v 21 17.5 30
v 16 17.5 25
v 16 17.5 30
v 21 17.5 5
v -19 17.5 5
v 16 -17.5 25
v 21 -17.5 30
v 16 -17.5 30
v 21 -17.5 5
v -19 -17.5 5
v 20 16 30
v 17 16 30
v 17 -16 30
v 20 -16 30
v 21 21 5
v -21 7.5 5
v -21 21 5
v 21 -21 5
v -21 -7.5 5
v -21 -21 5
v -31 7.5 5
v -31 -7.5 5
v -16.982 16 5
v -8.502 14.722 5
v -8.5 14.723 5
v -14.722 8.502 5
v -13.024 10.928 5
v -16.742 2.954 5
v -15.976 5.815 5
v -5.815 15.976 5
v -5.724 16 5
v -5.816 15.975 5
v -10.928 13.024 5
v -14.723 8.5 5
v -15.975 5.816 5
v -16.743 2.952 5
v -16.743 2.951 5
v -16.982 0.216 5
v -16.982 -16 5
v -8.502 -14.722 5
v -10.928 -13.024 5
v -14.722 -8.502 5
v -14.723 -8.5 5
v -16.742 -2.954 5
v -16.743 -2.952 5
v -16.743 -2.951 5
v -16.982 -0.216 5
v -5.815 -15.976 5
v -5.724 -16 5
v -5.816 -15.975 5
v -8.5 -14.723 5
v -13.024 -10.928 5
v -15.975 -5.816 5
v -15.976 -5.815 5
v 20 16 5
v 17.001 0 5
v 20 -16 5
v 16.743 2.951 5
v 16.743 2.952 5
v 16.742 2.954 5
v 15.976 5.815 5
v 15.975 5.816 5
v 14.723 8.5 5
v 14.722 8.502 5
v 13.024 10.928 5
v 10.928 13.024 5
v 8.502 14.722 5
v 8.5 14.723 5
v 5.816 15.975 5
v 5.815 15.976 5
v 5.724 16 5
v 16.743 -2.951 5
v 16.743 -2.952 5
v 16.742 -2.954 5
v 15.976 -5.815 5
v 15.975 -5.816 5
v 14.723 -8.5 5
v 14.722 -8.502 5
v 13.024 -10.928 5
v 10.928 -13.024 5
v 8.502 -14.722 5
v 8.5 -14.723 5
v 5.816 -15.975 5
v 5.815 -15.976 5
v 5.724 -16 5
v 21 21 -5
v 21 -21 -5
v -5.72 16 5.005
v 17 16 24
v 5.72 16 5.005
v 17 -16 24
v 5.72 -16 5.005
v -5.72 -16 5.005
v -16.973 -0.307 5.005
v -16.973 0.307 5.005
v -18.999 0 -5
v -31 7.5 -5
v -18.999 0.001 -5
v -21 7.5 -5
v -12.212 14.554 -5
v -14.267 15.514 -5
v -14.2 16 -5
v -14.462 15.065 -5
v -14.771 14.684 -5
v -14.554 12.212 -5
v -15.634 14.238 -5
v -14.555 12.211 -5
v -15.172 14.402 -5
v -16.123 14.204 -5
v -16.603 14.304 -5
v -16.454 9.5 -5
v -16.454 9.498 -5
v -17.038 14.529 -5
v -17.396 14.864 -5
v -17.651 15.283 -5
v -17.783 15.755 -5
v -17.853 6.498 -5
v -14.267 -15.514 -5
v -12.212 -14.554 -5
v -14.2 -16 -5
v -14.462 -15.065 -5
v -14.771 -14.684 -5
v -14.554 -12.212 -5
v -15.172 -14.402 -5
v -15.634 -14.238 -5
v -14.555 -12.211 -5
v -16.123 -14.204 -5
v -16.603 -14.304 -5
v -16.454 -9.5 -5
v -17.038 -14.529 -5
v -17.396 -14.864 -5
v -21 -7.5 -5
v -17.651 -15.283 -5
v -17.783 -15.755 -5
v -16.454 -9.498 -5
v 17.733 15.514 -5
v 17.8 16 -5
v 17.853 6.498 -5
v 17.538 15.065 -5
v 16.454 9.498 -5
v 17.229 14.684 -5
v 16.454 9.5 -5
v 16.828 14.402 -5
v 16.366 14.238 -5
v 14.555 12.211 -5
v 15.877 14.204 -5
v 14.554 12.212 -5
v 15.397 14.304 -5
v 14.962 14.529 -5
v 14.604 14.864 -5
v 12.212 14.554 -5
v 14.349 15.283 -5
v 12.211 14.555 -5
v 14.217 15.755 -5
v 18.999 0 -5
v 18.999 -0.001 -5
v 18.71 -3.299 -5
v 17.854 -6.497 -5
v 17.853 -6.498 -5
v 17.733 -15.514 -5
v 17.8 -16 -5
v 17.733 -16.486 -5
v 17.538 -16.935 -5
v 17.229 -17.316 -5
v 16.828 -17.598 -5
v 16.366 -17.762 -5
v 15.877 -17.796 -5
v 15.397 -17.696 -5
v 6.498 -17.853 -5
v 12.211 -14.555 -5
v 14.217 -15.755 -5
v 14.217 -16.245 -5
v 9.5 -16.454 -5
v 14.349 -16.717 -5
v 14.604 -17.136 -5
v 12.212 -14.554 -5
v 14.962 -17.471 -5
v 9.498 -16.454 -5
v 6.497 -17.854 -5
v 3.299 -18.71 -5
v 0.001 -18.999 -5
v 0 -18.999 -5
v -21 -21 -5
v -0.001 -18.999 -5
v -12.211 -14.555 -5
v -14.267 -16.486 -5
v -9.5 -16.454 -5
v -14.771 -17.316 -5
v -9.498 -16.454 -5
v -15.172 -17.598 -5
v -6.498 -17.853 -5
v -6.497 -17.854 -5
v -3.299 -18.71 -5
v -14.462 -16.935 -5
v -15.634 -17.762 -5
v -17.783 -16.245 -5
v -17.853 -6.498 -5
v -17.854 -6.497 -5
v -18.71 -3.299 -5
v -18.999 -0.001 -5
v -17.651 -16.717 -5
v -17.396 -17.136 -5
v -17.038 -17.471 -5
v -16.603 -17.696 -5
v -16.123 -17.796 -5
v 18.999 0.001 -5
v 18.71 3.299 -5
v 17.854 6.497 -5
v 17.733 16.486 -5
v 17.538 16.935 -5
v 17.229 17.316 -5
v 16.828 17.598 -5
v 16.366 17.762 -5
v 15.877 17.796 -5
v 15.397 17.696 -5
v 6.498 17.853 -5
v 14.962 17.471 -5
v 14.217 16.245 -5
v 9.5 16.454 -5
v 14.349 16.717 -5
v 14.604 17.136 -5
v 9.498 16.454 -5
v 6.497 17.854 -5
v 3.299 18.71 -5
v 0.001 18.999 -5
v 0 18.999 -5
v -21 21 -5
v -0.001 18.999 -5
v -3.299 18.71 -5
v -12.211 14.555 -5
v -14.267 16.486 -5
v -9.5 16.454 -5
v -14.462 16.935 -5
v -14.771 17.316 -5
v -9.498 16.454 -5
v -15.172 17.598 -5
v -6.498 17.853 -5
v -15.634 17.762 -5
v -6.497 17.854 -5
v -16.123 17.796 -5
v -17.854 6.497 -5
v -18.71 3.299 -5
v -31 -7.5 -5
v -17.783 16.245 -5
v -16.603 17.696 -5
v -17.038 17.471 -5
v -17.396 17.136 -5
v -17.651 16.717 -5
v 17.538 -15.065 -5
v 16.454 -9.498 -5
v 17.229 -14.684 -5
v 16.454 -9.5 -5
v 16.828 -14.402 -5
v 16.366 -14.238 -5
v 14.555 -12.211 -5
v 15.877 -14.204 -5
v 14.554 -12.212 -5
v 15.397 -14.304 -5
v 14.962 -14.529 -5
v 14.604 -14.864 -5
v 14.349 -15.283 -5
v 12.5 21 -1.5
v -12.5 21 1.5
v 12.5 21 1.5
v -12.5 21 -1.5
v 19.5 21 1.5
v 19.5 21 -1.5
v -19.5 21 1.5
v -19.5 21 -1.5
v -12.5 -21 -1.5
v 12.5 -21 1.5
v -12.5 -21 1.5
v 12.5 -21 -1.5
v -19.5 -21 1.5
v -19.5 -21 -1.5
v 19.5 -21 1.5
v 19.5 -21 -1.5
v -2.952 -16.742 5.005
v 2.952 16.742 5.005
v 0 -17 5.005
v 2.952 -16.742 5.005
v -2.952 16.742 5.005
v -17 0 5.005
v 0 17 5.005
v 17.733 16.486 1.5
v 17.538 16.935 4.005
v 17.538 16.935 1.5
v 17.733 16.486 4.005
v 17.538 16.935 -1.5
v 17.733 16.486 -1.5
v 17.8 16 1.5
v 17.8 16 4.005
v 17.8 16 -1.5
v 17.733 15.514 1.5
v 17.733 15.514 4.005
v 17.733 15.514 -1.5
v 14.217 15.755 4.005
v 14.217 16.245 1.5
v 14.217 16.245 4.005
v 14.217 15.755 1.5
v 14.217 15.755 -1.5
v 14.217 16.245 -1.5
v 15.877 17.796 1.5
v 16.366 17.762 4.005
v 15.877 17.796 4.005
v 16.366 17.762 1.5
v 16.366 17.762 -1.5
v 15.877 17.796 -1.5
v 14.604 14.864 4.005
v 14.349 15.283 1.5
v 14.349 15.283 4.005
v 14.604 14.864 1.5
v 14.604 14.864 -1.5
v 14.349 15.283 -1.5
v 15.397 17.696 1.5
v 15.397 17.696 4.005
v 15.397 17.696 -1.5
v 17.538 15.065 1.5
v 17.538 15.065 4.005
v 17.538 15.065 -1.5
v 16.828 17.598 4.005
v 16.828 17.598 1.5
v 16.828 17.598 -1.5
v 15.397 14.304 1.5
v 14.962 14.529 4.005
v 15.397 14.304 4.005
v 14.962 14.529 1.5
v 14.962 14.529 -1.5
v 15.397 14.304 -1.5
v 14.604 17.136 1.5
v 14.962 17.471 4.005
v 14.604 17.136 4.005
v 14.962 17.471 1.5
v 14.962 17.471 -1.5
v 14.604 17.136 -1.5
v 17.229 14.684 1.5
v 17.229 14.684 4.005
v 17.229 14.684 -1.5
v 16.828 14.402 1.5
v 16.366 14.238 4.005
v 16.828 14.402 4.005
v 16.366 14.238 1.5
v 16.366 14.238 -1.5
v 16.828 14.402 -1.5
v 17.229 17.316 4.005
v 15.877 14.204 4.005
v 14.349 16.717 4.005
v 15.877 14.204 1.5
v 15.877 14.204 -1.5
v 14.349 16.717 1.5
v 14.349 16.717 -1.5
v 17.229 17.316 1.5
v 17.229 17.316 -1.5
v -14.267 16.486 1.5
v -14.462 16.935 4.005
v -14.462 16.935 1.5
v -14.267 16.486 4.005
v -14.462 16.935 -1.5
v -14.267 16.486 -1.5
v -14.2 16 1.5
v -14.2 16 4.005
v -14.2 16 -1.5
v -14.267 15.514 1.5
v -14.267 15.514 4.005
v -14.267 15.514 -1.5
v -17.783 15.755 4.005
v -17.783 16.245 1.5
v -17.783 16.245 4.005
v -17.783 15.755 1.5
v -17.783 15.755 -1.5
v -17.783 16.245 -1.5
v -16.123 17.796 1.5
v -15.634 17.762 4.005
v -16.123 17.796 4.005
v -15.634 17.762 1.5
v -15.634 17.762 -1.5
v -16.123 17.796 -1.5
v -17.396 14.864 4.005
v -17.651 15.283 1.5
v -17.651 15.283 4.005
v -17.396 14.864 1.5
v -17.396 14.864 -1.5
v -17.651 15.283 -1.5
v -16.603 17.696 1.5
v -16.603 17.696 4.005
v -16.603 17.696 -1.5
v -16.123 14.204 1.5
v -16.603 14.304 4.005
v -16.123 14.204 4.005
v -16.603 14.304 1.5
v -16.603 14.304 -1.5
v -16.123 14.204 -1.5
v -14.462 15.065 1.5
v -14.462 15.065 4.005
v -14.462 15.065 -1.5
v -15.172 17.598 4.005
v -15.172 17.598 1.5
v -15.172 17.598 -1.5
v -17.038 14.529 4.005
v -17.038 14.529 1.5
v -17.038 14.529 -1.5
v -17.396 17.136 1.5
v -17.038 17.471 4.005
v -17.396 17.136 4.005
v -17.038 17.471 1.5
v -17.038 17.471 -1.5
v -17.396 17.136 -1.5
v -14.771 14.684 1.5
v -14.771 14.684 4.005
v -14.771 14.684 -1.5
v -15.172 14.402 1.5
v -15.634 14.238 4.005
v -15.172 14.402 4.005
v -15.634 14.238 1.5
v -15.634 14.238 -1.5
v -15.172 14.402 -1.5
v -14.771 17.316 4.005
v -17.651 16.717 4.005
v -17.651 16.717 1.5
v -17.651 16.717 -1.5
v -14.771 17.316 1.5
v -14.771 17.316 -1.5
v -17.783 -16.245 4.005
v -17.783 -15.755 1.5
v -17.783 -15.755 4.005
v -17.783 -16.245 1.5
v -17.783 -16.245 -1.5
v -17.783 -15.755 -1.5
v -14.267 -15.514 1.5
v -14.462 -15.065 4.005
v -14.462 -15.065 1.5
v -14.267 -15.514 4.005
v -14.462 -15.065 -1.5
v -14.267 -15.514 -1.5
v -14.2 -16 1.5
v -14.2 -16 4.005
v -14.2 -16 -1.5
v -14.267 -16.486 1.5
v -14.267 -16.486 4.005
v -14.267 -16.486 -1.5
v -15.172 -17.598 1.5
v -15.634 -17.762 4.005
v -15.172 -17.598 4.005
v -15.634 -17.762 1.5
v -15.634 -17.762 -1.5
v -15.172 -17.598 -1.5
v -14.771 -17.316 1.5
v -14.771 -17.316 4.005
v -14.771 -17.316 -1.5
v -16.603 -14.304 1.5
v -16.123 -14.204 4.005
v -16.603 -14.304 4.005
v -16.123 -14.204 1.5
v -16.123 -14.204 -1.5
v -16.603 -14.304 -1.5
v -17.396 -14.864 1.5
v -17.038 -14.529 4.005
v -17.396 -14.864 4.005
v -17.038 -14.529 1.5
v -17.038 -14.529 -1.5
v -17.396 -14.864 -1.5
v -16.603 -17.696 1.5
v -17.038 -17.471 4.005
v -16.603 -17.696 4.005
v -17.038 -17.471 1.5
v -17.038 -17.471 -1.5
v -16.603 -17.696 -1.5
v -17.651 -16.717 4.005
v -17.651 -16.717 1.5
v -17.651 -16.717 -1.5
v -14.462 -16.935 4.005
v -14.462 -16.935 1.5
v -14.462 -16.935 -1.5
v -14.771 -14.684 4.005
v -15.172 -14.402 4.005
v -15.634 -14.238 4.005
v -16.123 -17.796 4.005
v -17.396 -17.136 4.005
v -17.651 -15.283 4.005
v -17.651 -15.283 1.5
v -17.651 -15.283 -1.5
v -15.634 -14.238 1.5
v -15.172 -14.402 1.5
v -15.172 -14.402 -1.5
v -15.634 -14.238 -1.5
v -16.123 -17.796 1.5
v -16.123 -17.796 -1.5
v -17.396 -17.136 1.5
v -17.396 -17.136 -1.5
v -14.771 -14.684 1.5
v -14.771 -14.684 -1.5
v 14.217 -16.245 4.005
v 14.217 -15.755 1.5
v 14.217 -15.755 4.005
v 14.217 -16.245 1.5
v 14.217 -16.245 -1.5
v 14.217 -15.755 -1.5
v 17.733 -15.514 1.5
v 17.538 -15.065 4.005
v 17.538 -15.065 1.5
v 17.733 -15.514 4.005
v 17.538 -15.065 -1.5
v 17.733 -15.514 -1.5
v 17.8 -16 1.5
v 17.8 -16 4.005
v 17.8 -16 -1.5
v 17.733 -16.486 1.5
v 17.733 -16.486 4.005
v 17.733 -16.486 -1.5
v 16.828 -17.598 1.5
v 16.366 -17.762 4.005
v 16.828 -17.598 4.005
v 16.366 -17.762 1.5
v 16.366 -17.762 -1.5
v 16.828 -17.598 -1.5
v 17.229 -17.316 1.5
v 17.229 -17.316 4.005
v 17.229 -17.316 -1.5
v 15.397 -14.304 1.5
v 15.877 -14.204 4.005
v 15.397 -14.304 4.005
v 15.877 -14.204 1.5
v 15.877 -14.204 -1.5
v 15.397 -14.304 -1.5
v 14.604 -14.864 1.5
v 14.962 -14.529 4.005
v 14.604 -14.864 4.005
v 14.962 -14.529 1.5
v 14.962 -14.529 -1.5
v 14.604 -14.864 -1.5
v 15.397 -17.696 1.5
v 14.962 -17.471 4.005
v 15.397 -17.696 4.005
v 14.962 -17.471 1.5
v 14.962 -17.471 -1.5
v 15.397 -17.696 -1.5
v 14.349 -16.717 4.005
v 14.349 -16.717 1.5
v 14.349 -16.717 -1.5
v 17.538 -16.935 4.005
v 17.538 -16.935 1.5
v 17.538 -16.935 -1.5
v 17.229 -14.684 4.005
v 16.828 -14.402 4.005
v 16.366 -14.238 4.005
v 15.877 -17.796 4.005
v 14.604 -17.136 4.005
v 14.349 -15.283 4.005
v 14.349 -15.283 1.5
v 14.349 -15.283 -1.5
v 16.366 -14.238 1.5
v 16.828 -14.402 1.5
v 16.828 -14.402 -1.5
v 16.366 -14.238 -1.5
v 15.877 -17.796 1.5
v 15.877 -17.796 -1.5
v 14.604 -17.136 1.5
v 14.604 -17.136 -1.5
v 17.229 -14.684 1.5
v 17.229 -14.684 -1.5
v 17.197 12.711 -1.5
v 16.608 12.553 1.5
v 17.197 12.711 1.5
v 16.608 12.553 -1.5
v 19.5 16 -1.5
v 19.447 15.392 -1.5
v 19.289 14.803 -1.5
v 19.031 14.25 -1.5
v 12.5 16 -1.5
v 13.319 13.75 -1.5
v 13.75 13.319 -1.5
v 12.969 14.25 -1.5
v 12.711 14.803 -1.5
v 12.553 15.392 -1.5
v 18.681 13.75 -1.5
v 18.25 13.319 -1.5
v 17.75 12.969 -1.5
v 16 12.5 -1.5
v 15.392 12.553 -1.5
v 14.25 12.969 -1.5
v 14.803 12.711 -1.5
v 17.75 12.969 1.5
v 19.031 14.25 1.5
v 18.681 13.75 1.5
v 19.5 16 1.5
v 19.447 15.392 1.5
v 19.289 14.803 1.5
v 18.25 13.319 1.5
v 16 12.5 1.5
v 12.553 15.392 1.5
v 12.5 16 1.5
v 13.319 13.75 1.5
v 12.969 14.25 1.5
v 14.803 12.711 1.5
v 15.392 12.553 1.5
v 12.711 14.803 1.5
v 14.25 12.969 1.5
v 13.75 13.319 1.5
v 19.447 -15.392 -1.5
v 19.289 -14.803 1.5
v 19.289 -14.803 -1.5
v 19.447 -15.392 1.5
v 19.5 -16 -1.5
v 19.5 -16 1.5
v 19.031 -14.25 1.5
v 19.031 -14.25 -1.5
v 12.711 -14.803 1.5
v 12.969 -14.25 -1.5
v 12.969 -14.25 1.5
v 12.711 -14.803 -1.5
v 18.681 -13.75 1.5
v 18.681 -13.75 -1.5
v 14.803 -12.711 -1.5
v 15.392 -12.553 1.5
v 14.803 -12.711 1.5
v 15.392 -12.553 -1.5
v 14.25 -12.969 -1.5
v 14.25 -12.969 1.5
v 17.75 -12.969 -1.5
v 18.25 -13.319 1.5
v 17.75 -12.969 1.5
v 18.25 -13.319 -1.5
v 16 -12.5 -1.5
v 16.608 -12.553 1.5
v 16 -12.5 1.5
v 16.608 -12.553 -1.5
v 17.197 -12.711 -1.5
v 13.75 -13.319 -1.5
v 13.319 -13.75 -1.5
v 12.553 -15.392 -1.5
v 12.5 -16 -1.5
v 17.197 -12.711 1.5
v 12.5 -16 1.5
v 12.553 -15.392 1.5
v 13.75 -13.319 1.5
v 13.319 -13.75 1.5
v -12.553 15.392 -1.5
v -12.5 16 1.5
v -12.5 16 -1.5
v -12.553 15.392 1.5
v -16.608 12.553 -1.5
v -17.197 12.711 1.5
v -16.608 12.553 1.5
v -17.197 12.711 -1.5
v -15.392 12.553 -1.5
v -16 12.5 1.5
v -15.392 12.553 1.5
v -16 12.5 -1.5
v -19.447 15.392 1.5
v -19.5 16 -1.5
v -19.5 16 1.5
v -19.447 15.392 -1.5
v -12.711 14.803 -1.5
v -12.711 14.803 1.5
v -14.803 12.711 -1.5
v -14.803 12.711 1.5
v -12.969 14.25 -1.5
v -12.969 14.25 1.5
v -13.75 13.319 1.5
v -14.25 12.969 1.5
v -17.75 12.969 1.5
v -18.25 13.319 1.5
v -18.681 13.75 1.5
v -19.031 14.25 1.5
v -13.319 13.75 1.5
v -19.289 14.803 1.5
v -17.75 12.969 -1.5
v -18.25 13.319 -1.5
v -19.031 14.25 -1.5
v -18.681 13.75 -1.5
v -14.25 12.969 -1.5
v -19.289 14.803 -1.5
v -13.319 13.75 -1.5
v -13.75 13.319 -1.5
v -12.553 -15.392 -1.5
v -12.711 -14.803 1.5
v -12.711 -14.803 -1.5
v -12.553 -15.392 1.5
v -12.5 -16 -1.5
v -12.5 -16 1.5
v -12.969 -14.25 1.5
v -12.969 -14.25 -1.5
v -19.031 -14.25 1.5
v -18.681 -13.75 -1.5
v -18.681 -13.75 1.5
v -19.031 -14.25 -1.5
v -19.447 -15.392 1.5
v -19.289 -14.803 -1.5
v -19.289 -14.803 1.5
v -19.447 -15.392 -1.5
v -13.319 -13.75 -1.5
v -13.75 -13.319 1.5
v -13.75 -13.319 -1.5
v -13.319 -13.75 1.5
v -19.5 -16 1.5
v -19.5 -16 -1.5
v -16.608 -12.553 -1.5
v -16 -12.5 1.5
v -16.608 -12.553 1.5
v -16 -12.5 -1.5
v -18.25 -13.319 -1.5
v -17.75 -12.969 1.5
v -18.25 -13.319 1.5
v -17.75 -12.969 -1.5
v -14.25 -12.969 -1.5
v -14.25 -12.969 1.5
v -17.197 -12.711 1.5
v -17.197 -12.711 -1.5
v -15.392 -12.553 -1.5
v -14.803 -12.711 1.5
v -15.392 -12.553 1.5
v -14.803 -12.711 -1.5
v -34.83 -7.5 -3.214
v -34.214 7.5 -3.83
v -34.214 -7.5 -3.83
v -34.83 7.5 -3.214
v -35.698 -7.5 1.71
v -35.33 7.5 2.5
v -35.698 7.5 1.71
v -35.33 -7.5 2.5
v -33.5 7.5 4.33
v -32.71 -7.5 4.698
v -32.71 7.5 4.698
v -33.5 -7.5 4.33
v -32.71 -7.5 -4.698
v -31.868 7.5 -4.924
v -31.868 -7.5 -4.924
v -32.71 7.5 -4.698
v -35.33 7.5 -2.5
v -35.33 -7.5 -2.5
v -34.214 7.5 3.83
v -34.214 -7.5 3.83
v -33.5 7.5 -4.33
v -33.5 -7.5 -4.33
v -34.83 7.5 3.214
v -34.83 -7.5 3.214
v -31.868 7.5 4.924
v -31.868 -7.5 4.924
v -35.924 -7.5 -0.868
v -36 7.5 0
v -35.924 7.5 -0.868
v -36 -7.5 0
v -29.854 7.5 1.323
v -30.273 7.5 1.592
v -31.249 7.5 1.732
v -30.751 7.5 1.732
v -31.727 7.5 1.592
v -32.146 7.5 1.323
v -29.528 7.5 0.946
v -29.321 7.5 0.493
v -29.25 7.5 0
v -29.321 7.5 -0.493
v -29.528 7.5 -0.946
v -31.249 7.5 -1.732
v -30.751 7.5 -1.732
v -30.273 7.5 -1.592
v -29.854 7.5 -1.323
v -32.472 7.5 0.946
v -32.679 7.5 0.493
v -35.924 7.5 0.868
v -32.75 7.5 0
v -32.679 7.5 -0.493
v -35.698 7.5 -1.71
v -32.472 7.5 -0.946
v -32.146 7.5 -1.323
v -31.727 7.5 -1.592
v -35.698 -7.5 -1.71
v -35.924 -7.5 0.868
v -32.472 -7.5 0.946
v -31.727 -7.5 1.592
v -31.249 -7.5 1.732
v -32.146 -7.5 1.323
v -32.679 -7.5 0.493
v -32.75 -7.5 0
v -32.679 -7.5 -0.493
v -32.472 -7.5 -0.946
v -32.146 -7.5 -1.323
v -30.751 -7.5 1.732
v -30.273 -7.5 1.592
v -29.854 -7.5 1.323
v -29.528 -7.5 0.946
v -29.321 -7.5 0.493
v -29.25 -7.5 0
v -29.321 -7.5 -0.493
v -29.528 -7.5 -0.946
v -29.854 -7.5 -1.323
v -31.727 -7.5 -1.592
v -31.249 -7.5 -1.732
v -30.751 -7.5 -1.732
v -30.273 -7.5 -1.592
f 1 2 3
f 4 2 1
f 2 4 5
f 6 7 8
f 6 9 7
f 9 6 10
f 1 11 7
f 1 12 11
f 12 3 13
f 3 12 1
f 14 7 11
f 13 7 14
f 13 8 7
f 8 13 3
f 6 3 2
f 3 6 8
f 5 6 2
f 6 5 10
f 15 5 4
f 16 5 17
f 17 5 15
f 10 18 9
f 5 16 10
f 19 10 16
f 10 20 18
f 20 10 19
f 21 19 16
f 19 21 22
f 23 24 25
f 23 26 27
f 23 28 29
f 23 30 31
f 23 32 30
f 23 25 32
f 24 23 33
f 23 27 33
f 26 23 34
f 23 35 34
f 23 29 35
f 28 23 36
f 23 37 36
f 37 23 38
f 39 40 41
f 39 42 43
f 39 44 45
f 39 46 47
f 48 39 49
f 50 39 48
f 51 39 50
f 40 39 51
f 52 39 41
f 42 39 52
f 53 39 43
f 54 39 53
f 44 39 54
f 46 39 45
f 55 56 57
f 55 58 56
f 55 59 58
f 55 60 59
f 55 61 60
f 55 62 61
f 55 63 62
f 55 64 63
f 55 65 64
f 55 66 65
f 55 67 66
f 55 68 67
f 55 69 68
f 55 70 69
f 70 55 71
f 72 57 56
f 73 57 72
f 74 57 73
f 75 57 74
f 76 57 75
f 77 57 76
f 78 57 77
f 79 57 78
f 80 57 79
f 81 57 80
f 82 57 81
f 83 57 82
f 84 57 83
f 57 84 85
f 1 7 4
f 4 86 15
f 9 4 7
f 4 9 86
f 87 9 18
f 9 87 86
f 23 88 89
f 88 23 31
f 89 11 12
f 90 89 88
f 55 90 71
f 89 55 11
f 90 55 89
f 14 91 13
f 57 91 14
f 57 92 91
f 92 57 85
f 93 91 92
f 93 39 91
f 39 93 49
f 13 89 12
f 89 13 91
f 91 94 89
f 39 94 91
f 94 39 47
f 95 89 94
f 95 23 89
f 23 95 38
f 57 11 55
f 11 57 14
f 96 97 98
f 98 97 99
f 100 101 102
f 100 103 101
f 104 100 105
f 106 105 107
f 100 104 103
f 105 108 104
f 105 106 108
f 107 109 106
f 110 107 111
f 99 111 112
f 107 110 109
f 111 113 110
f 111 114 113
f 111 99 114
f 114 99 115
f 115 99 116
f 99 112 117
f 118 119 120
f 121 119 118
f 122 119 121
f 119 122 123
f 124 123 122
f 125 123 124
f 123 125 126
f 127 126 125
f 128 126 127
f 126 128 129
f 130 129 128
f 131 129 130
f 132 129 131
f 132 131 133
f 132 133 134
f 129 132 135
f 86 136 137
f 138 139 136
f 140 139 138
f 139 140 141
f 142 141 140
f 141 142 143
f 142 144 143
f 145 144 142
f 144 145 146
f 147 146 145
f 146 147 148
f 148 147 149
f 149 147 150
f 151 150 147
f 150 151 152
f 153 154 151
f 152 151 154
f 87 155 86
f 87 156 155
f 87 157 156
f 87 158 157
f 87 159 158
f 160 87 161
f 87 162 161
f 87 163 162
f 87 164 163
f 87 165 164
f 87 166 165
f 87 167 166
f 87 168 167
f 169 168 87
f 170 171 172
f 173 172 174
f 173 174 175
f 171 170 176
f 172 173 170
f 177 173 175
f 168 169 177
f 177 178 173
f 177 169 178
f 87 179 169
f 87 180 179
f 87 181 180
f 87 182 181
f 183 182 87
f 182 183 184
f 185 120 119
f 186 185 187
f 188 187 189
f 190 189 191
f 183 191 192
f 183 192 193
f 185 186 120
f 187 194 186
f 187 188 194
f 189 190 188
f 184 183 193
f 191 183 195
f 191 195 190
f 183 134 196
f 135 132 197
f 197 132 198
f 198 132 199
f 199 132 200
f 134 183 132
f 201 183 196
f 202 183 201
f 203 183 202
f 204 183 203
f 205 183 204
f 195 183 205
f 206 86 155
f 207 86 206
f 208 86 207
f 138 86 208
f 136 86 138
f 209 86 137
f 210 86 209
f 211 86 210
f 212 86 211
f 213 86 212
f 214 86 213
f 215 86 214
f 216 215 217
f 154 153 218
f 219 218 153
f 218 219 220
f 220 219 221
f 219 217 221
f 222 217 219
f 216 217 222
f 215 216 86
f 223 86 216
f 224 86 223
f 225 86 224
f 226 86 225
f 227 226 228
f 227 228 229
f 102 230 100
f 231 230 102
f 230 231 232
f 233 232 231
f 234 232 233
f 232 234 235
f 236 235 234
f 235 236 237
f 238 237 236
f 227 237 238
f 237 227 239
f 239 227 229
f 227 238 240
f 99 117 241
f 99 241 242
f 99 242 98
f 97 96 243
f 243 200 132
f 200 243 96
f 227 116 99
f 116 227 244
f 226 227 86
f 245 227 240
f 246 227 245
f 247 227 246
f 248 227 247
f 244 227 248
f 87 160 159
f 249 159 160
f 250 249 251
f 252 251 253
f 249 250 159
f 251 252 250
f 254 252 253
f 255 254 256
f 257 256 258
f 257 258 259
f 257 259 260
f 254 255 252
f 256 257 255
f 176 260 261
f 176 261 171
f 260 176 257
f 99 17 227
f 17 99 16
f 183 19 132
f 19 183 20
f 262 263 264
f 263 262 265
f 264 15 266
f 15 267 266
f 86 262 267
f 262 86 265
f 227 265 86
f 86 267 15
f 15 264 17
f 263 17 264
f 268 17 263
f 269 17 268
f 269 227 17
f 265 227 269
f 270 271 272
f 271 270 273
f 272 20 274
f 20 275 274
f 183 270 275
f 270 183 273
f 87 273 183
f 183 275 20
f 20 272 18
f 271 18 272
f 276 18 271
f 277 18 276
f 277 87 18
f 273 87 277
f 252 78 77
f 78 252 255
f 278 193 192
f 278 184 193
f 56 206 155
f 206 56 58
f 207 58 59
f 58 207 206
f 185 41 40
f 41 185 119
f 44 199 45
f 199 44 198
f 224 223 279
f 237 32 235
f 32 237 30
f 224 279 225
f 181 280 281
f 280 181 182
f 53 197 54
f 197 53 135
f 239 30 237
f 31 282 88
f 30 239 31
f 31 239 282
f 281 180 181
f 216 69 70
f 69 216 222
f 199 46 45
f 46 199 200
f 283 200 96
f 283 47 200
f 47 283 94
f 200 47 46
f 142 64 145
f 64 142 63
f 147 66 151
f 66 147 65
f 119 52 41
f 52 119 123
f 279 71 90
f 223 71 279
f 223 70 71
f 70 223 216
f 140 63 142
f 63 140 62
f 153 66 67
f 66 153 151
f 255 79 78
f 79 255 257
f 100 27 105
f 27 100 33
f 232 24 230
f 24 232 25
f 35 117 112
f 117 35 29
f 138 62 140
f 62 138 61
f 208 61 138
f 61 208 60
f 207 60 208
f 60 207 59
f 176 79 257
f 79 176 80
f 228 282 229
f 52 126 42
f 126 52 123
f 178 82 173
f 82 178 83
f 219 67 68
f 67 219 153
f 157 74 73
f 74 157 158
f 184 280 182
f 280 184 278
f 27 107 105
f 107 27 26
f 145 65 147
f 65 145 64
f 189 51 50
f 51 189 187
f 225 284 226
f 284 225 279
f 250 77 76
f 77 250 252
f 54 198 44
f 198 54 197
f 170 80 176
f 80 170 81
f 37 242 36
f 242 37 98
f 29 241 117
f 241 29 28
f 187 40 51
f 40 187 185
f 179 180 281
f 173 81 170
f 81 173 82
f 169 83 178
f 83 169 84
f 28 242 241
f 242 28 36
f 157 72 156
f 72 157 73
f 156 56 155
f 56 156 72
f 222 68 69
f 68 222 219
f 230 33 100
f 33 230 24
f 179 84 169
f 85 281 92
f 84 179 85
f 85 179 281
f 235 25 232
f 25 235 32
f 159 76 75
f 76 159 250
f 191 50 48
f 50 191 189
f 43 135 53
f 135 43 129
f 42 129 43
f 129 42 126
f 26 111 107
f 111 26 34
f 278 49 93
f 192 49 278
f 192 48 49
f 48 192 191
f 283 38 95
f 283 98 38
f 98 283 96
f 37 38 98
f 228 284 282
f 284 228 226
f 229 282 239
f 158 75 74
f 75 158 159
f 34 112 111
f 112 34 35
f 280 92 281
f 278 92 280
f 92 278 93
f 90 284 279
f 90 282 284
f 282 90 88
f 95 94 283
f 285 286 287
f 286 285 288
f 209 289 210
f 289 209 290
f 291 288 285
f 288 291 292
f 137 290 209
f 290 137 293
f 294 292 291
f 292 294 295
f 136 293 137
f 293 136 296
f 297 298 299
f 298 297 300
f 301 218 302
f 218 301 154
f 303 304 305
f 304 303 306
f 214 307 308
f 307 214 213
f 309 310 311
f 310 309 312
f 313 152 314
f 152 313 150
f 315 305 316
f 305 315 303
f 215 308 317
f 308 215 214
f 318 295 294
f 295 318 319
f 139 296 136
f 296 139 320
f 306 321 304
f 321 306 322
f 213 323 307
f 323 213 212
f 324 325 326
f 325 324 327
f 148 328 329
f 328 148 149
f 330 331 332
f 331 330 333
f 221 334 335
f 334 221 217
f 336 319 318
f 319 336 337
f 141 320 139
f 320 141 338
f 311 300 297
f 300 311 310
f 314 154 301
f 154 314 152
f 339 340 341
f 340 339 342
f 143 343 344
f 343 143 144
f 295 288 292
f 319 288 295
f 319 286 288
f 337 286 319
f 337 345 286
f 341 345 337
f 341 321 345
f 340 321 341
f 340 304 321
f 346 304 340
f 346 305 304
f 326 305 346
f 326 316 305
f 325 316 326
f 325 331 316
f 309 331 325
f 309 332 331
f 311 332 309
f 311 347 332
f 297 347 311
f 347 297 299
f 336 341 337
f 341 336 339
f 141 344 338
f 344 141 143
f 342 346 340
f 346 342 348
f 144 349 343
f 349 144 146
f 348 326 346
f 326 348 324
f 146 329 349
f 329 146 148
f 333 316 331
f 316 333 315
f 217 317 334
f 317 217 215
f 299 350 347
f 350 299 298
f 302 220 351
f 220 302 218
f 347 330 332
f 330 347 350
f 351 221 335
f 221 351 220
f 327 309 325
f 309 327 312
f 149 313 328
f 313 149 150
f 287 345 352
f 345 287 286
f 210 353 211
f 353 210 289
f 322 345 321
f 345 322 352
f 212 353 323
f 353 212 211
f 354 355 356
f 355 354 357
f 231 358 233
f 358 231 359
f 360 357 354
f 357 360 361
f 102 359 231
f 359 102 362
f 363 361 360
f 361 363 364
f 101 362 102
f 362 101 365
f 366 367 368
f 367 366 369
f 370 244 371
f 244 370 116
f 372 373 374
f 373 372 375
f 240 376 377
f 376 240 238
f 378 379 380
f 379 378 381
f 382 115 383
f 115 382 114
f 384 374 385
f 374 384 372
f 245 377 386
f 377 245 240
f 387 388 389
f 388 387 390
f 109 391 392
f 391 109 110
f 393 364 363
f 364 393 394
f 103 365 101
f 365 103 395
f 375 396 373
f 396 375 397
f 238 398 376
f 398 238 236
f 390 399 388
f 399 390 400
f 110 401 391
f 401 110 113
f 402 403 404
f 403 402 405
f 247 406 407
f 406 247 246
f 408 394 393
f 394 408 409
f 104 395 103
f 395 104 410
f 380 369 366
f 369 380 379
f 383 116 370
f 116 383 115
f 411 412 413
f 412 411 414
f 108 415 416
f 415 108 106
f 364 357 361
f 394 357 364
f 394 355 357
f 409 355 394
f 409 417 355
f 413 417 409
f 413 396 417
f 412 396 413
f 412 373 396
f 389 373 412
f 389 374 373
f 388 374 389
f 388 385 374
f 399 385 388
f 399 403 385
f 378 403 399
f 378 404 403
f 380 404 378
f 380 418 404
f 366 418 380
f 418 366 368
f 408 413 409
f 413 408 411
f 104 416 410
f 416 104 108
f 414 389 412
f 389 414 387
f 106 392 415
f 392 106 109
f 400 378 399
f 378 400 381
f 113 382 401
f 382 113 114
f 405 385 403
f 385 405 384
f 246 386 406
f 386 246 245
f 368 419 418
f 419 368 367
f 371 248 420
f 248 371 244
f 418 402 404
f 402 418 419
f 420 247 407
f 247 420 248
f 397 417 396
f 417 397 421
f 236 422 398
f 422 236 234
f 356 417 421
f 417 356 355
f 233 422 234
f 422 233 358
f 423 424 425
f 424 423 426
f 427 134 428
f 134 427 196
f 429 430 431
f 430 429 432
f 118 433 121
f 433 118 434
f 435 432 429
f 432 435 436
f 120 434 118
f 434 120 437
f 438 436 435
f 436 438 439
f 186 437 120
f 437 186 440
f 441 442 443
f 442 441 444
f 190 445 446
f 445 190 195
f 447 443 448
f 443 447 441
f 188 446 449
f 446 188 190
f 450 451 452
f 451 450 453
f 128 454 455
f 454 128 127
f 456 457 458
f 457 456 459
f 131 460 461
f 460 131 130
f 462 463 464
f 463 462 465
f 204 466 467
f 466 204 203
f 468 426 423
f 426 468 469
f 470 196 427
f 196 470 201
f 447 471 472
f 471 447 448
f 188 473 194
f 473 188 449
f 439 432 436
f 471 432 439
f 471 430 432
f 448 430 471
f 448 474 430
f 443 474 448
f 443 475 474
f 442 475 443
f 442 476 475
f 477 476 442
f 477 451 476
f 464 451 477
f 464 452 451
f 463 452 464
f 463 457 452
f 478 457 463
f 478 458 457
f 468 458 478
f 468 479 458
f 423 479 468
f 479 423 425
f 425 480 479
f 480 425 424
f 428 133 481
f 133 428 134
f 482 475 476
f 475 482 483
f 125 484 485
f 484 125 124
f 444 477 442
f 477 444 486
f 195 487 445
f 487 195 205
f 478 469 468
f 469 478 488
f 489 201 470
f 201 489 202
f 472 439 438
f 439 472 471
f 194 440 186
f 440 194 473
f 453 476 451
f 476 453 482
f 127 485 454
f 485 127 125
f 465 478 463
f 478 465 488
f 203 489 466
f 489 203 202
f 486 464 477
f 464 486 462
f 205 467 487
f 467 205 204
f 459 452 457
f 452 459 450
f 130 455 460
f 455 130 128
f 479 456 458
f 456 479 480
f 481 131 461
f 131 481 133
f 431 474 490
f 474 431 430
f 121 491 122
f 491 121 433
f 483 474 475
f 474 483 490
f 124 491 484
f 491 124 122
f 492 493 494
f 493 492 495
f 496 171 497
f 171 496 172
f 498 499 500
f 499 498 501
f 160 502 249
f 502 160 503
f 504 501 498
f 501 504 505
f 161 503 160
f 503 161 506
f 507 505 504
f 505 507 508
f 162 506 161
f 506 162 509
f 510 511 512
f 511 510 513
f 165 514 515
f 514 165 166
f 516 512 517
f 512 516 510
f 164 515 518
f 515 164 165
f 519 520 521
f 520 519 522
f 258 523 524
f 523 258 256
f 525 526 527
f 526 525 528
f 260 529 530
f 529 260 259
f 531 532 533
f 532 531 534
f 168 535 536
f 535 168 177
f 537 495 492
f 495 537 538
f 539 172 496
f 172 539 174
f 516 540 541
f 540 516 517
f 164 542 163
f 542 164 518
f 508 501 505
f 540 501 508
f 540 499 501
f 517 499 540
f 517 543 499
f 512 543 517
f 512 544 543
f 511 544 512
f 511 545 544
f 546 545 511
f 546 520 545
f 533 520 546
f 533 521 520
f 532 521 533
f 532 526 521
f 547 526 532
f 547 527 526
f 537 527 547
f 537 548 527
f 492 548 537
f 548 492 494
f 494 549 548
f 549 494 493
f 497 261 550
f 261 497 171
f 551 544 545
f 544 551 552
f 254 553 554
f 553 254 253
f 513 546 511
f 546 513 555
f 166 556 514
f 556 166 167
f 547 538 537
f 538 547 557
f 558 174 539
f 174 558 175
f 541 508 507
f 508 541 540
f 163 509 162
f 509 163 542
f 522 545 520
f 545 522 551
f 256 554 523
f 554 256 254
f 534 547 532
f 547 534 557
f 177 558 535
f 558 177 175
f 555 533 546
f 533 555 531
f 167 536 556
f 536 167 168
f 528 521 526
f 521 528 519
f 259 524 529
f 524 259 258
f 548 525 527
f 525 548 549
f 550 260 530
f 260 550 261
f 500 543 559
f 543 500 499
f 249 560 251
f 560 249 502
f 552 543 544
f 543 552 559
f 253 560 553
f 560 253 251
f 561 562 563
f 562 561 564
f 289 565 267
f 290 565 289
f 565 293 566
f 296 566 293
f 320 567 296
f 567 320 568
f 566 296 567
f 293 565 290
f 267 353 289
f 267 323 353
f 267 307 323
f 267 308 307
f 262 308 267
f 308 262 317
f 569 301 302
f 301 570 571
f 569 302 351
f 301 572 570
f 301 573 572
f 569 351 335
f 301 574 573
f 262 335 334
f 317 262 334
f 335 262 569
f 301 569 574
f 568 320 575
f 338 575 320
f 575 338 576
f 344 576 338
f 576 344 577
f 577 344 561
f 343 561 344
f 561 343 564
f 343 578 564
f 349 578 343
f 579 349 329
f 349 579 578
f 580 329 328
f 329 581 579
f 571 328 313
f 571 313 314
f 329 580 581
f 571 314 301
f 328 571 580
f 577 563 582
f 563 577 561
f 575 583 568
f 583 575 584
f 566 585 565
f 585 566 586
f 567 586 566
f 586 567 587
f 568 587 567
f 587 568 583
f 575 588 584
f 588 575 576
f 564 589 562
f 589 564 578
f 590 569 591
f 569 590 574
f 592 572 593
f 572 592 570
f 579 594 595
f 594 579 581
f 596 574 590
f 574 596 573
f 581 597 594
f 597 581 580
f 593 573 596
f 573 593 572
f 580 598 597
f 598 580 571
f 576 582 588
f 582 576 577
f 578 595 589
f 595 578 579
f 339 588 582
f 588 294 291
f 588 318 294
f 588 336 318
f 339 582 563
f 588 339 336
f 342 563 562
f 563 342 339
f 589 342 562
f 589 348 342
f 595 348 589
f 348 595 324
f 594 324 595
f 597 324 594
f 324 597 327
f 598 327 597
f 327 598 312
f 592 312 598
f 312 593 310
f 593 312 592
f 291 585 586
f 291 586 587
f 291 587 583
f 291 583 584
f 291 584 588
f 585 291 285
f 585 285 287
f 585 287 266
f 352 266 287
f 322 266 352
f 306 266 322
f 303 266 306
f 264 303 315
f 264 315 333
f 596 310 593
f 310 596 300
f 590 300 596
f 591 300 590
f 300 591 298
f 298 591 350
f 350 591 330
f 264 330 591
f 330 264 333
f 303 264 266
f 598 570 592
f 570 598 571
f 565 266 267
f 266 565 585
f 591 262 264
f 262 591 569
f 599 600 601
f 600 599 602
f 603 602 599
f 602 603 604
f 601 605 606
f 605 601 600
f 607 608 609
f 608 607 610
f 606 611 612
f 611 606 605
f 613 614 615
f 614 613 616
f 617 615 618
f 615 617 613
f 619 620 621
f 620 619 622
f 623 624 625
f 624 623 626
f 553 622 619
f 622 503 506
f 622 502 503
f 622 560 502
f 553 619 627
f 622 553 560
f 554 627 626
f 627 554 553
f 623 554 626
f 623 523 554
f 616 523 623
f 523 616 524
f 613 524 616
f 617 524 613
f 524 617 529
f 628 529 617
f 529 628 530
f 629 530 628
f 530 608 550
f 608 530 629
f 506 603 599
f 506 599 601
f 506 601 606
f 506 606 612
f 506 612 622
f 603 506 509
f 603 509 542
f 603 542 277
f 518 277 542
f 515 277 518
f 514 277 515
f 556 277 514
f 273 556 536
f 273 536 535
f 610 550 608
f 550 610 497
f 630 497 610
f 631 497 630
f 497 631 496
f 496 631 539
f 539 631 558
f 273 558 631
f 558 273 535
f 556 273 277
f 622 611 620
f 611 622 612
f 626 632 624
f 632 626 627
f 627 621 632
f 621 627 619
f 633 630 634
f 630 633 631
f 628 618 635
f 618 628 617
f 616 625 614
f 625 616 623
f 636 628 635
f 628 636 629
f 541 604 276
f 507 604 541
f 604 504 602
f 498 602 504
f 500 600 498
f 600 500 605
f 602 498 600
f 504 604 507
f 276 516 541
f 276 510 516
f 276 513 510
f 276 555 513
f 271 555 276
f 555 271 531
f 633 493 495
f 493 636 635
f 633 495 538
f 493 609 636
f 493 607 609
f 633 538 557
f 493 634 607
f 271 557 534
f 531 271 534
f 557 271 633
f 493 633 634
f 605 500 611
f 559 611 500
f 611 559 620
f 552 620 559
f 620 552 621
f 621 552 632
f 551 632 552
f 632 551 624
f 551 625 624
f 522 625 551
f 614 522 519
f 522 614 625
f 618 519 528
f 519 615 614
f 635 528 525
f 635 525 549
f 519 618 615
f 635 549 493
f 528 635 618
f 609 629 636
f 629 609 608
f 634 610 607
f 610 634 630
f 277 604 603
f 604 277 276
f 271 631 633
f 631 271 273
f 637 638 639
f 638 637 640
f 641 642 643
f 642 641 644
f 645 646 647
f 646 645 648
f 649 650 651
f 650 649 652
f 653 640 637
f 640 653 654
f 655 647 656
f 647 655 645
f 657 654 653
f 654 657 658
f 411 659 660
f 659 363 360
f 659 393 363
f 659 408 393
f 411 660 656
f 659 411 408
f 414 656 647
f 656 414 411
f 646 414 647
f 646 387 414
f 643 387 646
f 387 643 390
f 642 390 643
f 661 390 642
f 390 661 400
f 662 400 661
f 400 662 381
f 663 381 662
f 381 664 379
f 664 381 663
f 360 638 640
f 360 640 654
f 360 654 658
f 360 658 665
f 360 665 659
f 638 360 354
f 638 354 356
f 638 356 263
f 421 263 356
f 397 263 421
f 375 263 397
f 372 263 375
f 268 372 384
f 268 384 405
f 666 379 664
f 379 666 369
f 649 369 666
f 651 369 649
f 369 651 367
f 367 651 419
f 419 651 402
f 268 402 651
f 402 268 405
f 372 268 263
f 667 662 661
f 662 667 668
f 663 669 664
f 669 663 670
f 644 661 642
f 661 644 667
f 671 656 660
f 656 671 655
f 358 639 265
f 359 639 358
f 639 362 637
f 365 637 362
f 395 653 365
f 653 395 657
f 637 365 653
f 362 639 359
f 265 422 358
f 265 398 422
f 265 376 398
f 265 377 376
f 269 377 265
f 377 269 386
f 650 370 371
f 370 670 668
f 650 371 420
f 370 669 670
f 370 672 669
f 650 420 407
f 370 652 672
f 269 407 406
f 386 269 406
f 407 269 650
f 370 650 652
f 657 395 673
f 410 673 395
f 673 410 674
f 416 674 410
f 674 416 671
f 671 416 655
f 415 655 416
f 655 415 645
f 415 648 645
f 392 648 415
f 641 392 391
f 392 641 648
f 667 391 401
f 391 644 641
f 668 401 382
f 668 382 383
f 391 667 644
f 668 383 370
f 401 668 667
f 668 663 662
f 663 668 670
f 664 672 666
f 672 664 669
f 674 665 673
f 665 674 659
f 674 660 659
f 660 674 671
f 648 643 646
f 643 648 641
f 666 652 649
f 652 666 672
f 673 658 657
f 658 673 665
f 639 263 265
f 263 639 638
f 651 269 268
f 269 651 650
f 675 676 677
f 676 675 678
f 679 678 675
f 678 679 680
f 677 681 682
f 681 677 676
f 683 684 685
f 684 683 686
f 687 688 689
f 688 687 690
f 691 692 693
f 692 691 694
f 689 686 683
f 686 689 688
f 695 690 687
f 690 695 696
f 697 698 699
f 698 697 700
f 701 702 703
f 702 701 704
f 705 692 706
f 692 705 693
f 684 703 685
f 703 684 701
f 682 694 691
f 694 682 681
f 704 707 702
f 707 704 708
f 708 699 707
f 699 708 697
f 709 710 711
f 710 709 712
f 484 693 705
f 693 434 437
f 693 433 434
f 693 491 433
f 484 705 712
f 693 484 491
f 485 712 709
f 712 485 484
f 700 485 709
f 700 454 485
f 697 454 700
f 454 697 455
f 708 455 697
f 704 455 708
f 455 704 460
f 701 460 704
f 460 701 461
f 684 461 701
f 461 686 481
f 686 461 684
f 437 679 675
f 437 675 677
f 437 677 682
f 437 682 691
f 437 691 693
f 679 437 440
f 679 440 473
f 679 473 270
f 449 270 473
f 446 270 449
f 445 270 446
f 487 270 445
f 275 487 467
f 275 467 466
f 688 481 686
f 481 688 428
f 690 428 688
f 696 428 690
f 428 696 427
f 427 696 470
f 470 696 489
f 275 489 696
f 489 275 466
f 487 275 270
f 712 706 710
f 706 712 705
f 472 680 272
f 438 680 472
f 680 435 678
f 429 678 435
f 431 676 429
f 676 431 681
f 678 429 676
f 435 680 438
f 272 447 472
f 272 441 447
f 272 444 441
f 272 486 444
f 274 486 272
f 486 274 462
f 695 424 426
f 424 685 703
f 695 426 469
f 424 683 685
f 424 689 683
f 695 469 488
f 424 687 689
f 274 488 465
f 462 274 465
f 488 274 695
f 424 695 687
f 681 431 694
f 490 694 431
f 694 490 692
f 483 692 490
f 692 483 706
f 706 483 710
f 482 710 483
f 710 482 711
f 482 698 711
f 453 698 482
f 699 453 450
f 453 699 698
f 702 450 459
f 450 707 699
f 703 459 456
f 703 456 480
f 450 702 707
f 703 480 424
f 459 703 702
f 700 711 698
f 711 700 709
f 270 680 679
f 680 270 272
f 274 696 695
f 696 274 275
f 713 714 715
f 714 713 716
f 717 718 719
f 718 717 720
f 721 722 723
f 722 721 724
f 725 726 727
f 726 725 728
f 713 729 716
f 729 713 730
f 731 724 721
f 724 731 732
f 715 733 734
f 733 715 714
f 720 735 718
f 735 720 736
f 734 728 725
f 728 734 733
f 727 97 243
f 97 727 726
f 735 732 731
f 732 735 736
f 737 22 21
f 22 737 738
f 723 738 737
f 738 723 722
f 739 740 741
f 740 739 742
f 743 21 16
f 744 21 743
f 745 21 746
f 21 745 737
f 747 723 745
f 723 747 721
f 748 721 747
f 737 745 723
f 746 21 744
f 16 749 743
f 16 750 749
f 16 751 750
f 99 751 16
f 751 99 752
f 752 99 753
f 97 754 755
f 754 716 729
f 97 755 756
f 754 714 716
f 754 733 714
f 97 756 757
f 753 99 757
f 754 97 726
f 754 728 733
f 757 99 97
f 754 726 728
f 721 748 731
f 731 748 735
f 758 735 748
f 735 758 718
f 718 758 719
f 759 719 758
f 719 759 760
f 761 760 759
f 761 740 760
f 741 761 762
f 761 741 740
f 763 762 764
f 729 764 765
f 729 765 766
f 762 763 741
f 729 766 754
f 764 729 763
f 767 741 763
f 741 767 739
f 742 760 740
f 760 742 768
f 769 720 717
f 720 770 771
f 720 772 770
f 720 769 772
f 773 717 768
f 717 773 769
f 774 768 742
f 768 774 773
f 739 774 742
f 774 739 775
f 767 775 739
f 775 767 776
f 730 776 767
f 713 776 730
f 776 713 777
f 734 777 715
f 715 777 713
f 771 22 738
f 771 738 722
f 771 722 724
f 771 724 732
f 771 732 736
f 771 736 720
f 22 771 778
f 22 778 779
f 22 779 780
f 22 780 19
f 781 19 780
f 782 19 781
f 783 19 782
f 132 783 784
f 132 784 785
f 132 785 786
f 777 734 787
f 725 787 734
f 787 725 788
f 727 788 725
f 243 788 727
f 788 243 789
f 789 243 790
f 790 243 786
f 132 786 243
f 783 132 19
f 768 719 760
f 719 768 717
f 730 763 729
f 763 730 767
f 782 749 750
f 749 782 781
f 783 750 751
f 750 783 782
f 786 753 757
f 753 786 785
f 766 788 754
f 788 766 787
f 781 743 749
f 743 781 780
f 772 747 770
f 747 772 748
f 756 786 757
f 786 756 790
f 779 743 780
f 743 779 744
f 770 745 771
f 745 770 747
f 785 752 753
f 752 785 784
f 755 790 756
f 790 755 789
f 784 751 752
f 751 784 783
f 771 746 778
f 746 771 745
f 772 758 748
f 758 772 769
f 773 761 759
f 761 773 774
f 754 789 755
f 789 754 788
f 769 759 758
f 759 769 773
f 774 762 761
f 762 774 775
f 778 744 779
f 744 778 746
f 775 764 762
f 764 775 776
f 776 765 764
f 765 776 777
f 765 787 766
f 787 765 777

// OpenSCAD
$fa=10; $fs=0.5;

difference(){

    //exterior
    union(){
    
        //фланец
        cube([42,42,10], center=true);
        
        //сопло
        
        difference(){
        
            rotate([90,0,0])
                linear_extrude(height = 35, center = true, convexity = 10, twist = 0)
                    polygon([[-19, 5], [16, 25], [16, 30], [21, 30], [21, 5]], [[0,2,3,4], [0,1,2]]);
            
            rotate([90,0,0])
                linear_extrude(height = 32, center = true, convexity = 10, twist = 0)
                    polygon([[-17, 4.99], [17, 24], [17, 30.01], [20, 30.01], [20, 4.99]], [[0,2,3,4], [0,1,2]]);
        }
        

    }
    
    //interior
    union(){

        //центральное отверстие
        cylinder(h=10.01, r1=19, r2=17, center=true);
   
        //крепежные отверстия    
        {
            translate([16,16,-0.5]) cylinder(h=9.01, r=1.8, center=true);
            translate([-16,16, -0.5]) cylinder(h=9.01, r=1.8, center=true);
            translate([-16,-16, -0.5]) cylinder(h=9.01, r=1.8, center=true);
            translate([16, -16, -0.5]) cylinder(h=9.01, r=1.8, center=true);
            
            translate([16, 16, 0]) cylinder(h=3, r=3.5, center=true);
            translate([16, 19, 0]) cube([7,6,3], center=true);
            
            translate([16, -16, 0]) cylinder(h=3, r=3.5, center=true);
            translate([16, -19, 0]) cube([7,6,3], center=true);
            
            translate([-16, 16, 0]) cylinder(h=3, r=3.5, center=true);
            translate([-16, 19, 0]) cube([7,6,3], center=true);
            
            translate([-16, -16, 0]) cylinder(h=3, r=3.5, center=true);
            translate([-16, -19, 0]) cube([7,6,3], center=true);
        }
        
    }
 
    
}

// ухо
difference()
{
	hull(){
		translate([-31, 0, 0]) rotate([90, 0, 0]) cylinder(r=5, h=15, center=true);
		translate([-21, 0, 0]) cube([1, 15, 10], center=true);
	}

	translate([-31, 0, 0]) rotate([90, 0, 0]) cylinder(r=1.75, h=15.1, center=true);
}
